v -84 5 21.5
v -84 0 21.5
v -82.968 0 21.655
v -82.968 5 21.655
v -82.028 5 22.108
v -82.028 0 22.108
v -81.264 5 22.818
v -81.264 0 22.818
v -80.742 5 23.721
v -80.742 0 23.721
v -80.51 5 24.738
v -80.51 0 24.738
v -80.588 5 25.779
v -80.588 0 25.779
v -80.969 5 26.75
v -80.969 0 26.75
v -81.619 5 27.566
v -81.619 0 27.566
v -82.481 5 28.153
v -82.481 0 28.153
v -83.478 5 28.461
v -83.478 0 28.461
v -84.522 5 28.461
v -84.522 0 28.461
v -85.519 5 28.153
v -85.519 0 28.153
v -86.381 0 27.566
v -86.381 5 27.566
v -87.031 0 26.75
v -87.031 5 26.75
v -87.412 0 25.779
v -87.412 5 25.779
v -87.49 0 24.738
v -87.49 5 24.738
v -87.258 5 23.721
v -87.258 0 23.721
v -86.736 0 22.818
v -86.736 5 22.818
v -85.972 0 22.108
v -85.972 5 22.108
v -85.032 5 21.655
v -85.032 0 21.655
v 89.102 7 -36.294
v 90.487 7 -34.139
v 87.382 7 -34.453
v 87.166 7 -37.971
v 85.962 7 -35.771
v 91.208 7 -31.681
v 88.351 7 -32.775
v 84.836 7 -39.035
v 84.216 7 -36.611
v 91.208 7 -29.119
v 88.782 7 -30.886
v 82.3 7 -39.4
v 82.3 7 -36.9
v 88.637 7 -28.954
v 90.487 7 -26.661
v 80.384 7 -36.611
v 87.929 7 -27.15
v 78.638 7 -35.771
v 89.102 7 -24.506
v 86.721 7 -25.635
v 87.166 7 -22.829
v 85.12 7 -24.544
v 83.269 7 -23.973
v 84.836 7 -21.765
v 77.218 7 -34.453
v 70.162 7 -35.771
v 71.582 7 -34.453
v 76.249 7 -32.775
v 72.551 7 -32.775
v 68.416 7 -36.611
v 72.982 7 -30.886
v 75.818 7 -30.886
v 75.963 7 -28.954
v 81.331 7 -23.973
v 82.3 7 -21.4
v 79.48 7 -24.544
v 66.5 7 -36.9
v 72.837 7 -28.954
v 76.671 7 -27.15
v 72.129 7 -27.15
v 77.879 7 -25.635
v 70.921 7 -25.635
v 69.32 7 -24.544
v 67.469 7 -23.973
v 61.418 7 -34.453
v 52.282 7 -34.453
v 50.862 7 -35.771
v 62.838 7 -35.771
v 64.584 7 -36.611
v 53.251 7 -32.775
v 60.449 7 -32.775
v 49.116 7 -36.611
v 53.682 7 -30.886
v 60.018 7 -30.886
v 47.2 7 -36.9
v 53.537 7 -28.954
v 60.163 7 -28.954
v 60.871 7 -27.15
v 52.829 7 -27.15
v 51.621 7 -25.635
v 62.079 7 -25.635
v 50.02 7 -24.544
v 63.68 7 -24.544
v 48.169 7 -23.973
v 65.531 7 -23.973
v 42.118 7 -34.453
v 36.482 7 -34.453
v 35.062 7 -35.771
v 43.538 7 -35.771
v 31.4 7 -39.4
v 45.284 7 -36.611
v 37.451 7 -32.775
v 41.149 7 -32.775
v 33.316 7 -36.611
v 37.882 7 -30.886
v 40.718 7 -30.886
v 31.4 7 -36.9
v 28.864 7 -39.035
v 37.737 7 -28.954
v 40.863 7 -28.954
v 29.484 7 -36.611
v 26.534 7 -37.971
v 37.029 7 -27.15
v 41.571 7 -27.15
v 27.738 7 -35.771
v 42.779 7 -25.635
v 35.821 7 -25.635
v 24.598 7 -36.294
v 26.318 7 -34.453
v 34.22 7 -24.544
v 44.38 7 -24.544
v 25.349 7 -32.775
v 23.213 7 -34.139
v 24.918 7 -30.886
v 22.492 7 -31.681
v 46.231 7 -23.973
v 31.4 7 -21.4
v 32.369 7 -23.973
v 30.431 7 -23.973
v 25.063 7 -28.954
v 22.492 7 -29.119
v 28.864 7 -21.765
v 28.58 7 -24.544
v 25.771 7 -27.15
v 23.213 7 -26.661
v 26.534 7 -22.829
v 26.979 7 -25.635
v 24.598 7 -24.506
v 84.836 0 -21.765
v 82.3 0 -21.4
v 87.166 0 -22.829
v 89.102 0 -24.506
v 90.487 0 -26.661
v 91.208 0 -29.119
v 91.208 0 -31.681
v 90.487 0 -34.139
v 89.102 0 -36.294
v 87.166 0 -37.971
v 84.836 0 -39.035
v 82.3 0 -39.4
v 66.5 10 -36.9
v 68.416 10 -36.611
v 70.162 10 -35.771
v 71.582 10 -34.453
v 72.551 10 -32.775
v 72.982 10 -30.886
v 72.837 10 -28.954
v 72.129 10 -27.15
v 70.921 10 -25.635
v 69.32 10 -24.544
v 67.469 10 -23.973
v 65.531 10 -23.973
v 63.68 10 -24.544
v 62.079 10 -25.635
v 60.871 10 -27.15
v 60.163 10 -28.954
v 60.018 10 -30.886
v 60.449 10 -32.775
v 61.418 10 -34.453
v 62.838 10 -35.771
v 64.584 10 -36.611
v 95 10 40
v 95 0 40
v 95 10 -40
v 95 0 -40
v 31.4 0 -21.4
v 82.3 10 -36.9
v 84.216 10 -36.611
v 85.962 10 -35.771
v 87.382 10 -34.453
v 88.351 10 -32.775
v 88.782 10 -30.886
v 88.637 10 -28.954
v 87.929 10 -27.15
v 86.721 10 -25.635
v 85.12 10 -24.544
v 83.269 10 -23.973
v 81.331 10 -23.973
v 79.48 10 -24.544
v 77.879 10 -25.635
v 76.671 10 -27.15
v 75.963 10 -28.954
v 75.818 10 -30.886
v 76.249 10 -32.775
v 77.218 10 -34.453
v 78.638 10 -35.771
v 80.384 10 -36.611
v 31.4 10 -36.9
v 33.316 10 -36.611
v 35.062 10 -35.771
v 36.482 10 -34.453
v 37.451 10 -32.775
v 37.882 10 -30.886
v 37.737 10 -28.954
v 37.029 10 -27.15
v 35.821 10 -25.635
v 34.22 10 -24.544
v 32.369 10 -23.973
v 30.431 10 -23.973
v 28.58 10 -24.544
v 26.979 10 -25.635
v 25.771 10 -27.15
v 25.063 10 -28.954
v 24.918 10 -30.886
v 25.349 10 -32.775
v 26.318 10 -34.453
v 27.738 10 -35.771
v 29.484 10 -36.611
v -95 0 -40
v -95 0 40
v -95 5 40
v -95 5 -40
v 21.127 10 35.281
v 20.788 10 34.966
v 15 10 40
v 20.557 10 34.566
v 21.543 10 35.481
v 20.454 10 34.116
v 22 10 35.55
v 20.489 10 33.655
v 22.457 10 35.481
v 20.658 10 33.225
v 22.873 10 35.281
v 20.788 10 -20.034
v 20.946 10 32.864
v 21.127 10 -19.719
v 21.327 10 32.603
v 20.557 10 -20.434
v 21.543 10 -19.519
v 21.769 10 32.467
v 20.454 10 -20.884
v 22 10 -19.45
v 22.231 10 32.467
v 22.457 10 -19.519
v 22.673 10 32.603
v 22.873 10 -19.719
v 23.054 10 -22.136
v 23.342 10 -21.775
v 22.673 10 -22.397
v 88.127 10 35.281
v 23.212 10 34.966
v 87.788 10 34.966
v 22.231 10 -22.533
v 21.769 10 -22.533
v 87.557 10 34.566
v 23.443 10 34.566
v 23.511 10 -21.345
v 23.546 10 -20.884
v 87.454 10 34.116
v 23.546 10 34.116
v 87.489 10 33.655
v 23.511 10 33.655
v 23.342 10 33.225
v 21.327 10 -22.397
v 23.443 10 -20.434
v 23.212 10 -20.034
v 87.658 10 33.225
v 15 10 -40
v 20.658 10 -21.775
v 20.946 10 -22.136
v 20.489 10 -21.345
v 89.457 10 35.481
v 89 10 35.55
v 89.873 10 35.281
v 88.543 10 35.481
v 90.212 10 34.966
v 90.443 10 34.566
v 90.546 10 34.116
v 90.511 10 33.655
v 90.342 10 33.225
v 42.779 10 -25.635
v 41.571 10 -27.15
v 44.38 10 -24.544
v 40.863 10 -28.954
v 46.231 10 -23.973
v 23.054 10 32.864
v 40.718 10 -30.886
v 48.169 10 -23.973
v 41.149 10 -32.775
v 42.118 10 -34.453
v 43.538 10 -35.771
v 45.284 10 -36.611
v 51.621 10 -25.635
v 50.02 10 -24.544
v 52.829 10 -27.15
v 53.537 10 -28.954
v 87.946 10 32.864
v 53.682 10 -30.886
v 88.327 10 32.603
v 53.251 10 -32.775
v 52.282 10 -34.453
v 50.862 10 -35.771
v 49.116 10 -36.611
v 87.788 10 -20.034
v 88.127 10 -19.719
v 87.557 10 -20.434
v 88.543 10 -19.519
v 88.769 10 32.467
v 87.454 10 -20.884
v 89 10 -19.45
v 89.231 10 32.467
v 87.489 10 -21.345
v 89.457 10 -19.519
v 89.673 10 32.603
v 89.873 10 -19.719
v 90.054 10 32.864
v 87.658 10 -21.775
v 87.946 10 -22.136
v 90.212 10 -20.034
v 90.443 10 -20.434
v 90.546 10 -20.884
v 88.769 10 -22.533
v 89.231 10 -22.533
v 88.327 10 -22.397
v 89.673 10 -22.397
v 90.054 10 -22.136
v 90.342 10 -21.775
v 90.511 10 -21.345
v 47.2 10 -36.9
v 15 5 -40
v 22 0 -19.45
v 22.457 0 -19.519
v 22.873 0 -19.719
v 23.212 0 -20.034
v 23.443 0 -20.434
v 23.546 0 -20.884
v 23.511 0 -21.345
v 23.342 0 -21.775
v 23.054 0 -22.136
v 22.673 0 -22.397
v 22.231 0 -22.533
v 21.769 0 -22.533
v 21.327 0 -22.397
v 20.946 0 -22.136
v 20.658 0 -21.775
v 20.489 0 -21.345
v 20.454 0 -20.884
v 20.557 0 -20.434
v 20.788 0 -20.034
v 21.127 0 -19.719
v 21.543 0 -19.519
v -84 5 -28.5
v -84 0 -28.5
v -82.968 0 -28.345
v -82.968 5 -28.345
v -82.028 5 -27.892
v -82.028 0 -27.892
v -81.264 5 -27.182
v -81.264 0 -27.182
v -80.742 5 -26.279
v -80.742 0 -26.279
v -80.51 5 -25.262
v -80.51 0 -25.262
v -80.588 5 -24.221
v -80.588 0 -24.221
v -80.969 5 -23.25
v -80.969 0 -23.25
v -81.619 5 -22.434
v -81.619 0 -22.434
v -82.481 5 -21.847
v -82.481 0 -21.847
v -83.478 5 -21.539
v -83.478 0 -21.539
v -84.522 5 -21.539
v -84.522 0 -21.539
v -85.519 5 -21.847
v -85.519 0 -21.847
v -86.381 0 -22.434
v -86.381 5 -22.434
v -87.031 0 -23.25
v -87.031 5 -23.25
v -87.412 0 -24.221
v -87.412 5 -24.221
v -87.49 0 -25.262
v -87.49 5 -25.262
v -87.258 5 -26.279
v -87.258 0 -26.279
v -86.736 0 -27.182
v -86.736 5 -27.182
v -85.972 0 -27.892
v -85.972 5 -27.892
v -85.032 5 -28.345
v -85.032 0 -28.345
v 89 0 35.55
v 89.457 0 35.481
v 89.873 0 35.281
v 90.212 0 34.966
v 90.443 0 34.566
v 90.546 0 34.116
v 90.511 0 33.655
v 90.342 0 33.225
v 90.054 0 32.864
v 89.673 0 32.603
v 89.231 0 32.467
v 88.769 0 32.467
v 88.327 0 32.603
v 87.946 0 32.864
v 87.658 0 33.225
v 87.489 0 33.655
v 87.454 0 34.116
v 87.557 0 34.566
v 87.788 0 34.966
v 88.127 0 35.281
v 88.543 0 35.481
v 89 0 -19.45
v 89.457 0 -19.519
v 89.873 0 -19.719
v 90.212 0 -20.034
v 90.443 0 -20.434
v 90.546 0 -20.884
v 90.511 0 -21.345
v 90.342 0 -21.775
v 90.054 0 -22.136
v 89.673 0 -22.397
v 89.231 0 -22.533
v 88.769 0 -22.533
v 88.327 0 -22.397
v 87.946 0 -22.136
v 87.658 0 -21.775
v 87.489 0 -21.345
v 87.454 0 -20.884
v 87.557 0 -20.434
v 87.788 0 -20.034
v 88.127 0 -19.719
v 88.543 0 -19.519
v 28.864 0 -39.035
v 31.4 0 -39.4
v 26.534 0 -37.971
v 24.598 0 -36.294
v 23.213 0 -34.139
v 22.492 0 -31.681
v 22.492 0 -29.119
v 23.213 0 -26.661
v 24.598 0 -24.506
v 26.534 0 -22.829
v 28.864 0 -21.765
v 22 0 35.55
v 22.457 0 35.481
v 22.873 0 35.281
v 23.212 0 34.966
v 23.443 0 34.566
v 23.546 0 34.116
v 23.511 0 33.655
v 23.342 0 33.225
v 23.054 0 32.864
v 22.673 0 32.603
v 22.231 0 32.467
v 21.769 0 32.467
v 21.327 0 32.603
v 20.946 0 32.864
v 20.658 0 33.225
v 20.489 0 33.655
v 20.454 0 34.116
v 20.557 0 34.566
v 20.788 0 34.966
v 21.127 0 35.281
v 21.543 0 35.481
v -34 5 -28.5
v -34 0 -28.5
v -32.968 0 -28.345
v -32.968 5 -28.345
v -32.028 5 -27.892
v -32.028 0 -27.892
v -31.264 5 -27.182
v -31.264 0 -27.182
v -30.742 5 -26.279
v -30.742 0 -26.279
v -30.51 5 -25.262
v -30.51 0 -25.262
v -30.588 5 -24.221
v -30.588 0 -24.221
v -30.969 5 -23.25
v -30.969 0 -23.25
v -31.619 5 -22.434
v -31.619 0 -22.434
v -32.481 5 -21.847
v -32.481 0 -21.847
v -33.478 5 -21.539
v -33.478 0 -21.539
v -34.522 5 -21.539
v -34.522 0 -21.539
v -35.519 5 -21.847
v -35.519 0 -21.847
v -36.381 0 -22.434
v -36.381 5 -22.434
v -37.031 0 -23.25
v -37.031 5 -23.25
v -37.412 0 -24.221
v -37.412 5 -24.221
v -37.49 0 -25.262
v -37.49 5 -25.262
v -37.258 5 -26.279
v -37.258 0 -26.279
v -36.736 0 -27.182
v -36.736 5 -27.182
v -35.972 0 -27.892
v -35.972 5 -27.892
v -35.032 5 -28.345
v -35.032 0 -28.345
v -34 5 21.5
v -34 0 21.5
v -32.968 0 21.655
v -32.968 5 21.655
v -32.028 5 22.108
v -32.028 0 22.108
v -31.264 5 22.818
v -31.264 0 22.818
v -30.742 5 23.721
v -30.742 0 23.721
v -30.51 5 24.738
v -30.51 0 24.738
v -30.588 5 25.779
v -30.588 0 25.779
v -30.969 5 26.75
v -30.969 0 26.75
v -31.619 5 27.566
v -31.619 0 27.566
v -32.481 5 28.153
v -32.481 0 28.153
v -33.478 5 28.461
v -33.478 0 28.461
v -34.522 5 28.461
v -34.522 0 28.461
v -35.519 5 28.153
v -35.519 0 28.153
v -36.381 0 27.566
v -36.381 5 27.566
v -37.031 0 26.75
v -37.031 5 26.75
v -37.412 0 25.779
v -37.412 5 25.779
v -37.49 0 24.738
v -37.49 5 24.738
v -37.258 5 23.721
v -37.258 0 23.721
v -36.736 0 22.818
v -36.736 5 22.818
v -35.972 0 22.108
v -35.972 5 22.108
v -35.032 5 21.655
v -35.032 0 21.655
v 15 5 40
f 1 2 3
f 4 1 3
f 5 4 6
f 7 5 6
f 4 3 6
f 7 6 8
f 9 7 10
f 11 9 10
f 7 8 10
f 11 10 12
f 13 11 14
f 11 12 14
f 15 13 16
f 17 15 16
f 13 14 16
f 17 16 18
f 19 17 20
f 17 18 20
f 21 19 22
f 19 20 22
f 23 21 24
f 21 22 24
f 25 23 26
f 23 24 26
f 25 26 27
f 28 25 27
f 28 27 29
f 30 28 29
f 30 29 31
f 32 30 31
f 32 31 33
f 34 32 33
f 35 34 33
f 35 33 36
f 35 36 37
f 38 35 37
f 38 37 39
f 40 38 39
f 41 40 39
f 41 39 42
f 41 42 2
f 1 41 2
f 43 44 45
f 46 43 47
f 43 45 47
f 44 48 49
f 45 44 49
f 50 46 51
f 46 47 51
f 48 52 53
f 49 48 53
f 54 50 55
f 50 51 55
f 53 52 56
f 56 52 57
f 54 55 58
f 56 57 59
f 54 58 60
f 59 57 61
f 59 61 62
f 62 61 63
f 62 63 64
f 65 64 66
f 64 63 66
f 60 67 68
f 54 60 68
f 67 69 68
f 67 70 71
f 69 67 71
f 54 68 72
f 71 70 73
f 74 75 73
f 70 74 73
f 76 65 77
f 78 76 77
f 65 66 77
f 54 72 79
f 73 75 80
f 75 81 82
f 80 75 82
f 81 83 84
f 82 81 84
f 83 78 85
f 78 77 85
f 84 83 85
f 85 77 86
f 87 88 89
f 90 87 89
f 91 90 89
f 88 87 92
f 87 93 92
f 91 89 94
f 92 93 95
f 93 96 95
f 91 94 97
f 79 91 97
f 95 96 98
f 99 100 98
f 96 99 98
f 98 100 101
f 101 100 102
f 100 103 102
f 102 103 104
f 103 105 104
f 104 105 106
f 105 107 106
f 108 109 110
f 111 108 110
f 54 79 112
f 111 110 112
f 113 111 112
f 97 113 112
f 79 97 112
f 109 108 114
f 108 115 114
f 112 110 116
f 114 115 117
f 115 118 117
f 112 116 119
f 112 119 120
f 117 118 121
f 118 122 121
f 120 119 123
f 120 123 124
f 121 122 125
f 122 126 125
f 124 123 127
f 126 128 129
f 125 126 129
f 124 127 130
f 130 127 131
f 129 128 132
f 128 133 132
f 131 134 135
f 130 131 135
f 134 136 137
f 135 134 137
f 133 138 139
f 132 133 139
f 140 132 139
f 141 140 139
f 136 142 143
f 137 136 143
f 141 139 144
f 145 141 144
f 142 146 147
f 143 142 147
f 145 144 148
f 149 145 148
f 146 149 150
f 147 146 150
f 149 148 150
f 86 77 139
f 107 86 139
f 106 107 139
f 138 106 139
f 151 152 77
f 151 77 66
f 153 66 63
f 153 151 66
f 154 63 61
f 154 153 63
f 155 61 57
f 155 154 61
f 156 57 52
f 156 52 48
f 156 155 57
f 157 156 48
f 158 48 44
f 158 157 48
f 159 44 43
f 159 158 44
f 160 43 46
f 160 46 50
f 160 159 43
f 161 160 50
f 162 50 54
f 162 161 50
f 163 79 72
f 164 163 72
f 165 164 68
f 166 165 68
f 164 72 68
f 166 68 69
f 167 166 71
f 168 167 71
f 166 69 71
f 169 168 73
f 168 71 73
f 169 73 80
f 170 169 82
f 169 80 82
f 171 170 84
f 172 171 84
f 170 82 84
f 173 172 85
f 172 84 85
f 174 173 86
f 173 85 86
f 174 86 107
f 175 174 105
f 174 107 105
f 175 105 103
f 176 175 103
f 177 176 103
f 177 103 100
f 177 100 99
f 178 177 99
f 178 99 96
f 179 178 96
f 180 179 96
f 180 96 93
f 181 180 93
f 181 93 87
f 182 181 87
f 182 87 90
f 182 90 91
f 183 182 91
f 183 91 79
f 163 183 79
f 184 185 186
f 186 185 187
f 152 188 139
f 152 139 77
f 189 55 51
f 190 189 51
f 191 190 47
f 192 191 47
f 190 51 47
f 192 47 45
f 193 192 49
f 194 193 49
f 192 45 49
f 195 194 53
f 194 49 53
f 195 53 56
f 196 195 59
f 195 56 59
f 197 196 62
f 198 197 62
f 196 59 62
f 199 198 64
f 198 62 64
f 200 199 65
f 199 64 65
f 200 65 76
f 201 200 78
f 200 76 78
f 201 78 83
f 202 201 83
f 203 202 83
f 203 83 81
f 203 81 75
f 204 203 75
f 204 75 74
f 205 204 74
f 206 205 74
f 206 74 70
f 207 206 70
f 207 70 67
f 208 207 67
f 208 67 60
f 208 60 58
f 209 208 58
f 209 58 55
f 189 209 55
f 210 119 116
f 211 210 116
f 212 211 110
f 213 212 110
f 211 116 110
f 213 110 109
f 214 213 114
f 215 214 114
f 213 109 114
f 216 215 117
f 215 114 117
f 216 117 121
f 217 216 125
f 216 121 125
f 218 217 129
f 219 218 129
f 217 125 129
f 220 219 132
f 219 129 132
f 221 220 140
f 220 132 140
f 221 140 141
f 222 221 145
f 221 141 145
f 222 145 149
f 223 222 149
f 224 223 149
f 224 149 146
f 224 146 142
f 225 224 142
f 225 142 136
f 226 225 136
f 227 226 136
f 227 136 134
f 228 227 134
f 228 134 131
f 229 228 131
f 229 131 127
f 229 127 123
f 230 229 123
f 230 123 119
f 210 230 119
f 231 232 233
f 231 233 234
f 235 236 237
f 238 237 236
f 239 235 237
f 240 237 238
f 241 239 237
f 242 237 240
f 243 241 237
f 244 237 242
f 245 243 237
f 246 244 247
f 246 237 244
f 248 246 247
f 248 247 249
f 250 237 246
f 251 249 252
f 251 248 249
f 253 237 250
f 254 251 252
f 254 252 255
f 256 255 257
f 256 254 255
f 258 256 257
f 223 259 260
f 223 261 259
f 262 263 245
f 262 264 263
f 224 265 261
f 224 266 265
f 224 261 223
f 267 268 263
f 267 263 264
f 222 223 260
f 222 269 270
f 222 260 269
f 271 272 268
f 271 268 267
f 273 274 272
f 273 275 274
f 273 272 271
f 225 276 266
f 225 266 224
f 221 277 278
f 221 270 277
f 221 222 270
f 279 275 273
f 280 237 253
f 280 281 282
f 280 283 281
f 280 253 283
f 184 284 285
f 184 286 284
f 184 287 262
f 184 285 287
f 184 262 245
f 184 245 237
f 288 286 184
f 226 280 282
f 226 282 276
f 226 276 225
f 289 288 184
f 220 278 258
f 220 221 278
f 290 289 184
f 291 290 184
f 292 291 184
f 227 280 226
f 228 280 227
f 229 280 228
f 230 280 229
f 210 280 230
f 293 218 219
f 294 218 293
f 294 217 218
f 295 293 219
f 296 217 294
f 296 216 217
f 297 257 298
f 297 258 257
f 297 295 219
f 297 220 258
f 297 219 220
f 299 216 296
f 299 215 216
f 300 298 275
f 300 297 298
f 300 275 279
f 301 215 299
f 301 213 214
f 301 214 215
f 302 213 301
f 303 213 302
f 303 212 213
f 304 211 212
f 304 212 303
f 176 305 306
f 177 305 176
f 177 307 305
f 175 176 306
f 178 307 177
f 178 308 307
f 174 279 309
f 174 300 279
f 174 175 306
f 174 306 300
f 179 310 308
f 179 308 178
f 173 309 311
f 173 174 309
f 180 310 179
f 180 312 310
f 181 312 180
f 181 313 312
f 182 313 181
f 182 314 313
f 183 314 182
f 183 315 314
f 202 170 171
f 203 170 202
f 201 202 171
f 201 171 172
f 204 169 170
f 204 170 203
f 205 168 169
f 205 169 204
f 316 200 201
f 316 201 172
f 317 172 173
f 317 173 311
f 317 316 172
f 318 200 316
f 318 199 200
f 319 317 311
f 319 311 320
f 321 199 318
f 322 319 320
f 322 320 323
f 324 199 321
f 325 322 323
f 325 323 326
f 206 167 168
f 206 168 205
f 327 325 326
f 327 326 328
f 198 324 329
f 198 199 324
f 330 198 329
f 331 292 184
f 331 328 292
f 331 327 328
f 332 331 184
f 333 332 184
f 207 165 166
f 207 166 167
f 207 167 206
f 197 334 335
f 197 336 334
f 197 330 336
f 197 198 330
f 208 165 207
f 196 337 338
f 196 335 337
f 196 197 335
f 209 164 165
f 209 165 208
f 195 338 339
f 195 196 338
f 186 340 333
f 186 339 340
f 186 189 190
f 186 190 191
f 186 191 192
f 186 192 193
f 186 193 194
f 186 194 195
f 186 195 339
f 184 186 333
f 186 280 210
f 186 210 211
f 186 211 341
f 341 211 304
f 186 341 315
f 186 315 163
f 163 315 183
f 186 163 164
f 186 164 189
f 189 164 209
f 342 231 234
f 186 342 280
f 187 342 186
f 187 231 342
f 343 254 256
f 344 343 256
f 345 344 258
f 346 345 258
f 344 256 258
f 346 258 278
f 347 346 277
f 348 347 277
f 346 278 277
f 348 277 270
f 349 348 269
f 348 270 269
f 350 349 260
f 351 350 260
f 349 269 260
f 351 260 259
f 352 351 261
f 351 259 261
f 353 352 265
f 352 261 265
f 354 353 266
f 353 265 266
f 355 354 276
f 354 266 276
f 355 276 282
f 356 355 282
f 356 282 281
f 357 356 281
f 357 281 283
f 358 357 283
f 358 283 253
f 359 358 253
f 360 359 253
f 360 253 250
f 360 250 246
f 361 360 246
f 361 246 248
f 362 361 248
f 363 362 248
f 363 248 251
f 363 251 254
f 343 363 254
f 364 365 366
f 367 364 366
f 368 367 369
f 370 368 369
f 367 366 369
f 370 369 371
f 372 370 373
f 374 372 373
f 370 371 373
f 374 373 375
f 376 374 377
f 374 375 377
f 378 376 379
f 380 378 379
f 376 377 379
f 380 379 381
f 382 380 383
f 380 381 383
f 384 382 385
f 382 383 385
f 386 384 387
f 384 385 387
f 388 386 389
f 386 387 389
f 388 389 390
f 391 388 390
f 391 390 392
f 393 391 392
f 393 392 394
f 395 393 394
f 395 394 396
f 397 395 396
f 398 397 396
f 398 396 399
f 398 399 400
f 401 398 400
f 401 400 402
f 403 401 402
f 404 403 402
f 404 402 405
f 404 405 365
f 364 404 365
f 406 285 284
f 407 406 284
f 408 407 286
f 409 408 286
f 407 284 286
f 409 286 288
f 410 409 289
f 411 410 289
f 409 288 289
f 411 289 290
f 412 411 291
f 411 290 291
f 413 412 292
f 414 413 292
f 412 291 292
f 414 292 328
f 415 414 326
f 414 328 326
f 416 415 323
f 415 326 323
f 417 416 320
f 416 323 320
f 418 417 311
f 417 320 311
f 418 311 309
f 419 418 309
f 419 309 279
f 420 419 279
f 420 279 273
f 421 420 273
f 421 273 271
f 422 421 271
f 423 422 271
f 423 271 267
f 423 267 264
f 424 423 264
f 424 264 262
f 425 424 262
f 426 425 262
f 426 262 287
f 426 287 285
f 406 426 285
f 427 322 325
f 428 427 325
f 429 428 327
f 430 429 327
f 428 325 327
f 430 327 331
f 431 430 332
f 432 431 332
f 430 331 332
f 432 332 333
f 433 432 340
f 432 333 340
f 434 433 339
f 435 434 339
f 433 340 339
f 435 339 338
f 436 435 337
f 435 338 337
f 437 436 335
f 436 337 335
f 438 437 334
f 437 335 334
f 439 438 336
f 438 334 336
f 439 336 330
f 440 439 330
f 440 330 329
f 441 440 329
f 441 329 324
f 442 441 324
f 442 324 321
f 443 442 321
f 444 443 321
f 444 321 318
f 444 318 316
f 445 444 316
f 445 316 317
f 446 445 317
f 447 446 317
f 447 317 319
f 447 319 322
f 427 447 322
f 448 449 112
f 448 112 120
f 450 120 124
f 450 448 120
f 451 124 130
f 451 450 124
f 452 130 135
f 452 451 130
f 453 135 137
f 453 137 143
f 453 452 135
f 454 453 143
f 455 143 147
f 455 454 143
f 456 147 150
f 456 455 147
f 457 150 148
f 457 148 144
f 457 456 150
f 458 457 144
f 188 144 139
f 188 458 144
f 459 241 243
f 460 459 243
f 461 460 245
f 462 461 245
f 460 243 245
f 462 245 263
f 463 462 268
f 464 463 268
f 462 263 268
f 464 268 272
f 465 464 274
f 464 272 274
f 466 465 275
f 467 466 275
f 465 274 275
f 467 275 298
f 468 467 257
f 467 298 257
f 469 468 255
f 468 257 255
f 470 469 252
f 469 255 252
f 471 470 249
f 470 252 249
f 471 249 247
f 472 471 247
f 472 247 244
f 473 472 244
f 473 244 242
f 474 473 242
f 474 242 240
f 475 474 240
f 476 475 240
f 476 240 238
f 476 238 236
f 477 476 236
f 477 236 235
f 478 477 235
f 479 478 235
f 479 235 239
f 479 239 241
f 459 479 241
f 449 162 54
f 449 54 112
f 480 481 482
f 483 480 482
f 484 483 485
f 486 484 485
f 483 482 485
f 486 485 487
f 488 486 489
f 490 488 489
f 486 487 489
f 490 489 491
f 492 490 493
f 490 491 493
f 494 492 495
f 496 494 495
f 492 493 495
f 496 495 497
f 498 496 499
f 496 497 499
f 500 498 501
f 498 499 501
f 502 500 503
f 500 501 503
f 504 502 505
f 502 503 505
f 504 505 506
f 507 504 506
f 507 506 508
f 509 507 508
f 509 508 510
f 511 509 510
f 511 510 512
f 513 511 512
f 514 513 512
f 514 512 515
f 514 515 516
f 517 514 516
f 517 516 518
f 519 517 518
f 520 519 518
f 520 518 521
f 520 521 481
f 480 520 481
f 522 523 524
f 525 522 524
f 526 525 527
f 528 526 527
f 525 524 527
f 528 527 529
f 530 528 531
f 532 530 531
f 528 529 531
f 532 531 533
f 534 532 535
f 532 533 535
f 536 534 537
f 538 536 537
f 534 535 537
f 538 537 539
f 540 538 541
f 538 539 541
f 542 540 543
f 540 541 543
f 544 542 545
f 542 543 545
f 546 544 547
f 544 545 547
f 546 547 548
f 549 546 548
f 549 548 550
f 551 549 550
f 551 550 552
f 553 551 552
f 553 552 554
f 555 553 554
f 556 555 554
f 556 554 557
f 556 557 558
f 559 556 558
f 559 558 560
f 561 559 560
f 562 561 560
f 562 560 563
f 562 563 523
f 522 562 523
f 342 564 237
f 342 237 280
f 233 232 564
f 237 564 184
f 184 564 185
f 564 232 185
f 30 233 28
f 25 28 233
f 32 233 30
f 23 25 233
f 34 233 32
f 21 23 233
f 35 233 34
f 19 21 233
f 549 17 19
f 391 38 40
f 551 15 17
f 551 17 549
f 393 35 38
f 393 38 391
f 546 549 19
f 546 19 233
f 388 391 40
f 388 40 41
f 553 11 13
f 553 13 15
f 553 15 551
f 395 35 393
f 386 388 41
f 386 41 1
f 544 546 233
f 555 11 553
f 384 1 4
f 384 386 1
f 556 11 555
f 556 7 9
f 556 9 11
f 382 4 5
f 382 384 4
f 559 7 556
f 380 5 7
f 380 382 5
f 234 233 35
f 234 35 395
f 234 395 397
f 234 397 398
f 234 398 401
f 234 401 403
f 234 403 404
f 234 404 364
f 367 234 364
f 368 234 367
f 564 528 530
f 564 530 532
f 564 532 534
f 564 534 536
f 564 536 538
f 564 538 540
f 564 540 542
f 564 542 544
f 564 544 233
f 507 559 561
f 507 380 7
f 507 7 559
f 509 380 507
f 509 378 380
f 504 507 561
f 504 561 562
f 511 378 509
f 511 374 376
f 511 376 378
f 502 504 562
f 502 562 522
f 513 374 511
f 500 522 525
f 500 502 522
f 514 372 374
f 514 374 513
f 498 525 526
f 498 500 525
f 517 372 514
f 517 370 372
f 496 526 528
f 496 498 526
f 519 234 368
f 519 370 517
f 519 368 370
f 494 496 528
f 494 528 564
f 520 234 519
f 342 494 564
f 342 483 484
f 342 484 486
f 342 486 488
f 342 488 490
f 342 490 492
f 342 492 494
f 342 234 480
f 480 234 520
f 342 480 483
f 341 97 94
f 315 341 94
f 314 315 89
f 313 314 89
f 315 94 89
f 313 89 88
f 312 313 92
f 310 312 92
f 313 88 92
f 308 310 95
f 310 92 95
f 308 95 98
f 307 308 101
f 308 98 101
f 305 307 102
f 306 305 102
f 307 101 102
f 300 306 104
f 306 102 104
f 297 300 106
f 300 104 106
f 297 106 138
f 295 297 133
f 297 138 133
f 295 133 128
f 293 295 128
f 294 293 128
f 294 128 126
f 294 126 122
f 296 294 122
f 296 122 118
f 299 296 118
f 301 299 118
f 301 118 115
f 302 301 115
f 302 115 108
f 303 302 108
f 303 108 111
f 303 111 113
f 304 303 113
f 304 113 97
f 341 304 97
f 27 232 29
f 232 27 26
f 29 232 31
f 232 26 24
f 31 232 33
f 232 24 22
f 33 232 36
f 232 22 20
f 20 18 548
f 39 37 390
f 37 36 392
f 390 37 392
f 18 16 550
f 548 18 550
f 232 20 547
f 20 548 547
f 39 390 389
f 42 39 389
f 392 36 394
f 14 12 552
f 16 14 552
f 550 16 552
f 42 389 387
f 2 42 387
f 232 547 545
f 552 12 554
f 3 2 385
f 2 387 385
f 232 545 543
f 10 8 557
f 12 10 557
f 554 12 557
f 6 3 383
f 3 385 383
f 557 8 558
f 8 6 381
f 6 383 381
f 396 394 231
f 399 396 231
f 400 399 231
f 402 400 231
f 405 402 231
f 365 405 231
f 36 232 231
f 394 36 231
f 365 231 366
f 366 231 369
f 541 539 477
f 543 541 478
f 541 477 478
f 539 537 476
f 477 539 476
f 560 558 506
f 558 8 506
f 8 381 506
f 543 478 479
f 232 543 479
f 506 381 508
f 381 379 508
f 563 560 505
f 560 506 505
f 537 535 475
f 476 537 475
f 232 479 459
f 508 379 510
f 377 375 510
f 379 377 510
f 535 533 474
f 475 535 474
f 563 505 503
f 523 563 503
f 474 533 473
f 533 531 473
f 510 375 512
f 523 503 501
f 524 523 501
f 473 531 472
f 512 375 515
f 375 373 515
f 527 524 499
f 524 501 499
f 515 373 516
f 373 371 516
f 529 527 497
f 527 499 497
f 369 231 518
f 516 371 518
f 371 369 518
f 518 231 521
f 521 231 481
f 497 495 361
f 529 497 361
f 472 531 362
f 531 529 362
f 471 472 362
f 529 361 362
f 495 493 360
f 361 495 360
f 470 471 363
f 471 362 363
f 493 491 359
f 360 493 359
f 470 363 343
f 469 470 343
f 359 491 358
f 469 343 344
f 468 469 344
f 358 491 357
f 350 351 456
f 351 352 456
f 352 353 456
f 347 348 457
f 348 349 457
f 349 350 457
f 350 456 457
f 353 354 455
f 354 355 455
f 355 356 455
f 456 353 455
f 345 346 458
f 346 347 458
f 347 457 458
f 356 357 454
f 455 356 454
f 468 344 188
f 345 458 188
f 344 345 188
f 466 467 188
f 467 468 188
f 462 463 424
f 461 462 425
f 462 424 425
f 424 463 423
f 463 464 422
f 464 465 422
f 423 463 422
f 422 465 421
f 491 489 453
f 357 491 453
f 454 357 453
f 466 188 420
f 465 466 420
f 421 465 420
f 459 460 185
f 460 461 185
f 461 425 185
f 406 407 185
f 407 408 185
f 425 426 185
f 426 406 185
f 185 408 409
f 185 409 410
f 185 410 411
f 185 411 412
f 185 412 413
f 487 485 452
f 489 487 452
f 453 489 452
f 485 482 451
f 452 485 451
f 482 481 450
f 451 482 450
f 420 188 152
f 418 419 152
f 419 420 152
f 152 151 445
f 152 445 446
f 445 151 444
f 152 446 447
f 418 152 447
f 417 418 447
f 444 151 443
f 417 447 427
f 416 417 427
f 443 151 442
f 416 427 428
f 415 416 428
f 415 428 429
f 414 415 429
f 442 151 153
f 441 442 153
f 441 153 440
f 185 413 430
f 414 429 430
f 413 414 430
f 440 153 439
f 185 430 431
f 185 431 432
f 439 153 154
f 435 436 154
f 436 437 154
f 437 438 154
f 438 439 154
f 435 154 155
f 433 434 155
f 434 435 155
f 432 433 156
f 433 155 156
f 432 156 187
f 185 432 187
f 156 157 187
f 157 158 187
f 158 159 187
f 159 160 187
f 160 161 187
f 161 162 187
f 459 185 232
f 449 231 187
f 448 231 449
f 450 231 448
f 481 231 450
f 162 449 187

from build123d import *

# Parameters (mm, degrees)
SKETCH1_W           = 190
SKETCH1_H           = 80
BOSS_EXTRUDE1_DEPTH = 5
SKETCH3_W           = 80
SKETCH3_H           = 80
BOSS_EXTRUDE2_DEPTH = 5
SKETCH4_R           = 1.55
CUT_EXTRUDE1_DEPTH  = 104.561575886
SKETCH5_R           = 6.5
CUT_EXTRUDE2_DEPTH  = 104.561575886
CUT_EXTRUDE3_DEPTH  = 7
SKETCH7_R           = 3.5
CUT_EXTRUDE4_DEPTH  = 104.561575886


with BuildPart() as part:
    # Sketch1 → Boss-Extrude1 (new body)
    with BuildSketch(Plane(origin=(0, 0, 0), x_dir=(1, 0, 0), z_dir=(0, 1, 0))):
        Rectangle(SKETCH1_W, SKETCH1_H)
    extrude(amount=BOSS_EXTRUDE1_DEPTH)

    # Sketch3 → Boss-Extrude2 (add)
    with BuildSketch(Plane(origin=(0, 5, 0), x_dir=(1, 0, 0), z_dir=(0, 1, 0))):
        with Locations((55, 0)):
            Rectangle(SKETCH3_W, SKETCH3_H)
    extrude(amount=BOSS_EXTRUDE2_DEPTH)

    # Sketch4 → Cut-Extrude1 (cut, through all)
    with BuildSketch(Plane(origin=(0, 10, 0), x_dir=(1, 0, 0), z_dir=(0, 1, 0))):
        with Locations(Location((22, 21, 0), (0, 0, 270))):
            Circle(SKETCH4_R)
        with Locations(Location((89, 21, 0), (0, 0, 270))):
            Circle(SKETCH4_R)
        with Locations(Location((22, -34, 0), (0, 0, 270))):
            Circle(SKETCH4_R)
        with Locations(Location((89, -34, 0), (0, 0, 270))):
            Circle(SKETCH4_R)
    extrude(amount=-CUT_EXTRUDE1_DEPTH, mode=Mode.SUBTRACT)

    # Sketch5 → Cut-Extrude2 (cut, through all)
    with BuildSketch(Plane.XZ):
        with Locations(Location((31.4, -30.4, 0), (0, 0, 270))):
            Circle(SKETCH5_R)
        with Locations(Location((47.2, -30.4, 0), (0, 0, 270))):
            Circle(SKETCH5_R)
        with Locations(Location((66.5, -30.4, 0), (0, 0, 270))):
            Circle(SKETCH5_R)
        with Locations(Location((82.3, -30.4, 0), (0, 0, 270))):
            Circle(SKETCH5_R)
    extrude(amount=-CUT_EXTRUDE2_DEPTH, mode=Mode.SUBTRACT)

    # Sketch6 → Cut-Extrude3 (cut)
    with BuildSketch(Plane.XZ):
        with BuildLine():
            Line((31.4, -21.4), (82.3, -21.4))
            ThreePointArc((82.3, -21.4), (91.3, -30.4), (82.3, -39.4))
            Line((82.3, -39.4), (31.4, -39.4))
            ThreePointArc((31.4, -39.4), (22.4, -30.4), (31.4, -21.4))
        make_face()
    extrude(amount=-CUT_EXTRUDE3_DEPTH, mode=Mode.SUBTRACT)

    # Sketch7 → Cut-Extrude4 (cut, through all)
    with BuildSketch(Plane.XZ):
        with Locations(Location((-84, 25, 0), (0, 0, 270))):
            Circle(SKETCH7_R)
        with Locations(Location((-34, 25, 0), (0, 0, 270))):
            Circle(SKETCH7_R)
        with Locations(Location((-84, -25, 0), (0, 0, 270))):
            Circle(SKETCH7_R)
        with Locations(Location((-34, -25, 0), (0, 0, 270))):
            Circle(SKETCH7_R)
    extrude(amount=-CUT_EXTRUDE4_DEPTH, mode=Mode.SUBTRACT)


solid = part.part
